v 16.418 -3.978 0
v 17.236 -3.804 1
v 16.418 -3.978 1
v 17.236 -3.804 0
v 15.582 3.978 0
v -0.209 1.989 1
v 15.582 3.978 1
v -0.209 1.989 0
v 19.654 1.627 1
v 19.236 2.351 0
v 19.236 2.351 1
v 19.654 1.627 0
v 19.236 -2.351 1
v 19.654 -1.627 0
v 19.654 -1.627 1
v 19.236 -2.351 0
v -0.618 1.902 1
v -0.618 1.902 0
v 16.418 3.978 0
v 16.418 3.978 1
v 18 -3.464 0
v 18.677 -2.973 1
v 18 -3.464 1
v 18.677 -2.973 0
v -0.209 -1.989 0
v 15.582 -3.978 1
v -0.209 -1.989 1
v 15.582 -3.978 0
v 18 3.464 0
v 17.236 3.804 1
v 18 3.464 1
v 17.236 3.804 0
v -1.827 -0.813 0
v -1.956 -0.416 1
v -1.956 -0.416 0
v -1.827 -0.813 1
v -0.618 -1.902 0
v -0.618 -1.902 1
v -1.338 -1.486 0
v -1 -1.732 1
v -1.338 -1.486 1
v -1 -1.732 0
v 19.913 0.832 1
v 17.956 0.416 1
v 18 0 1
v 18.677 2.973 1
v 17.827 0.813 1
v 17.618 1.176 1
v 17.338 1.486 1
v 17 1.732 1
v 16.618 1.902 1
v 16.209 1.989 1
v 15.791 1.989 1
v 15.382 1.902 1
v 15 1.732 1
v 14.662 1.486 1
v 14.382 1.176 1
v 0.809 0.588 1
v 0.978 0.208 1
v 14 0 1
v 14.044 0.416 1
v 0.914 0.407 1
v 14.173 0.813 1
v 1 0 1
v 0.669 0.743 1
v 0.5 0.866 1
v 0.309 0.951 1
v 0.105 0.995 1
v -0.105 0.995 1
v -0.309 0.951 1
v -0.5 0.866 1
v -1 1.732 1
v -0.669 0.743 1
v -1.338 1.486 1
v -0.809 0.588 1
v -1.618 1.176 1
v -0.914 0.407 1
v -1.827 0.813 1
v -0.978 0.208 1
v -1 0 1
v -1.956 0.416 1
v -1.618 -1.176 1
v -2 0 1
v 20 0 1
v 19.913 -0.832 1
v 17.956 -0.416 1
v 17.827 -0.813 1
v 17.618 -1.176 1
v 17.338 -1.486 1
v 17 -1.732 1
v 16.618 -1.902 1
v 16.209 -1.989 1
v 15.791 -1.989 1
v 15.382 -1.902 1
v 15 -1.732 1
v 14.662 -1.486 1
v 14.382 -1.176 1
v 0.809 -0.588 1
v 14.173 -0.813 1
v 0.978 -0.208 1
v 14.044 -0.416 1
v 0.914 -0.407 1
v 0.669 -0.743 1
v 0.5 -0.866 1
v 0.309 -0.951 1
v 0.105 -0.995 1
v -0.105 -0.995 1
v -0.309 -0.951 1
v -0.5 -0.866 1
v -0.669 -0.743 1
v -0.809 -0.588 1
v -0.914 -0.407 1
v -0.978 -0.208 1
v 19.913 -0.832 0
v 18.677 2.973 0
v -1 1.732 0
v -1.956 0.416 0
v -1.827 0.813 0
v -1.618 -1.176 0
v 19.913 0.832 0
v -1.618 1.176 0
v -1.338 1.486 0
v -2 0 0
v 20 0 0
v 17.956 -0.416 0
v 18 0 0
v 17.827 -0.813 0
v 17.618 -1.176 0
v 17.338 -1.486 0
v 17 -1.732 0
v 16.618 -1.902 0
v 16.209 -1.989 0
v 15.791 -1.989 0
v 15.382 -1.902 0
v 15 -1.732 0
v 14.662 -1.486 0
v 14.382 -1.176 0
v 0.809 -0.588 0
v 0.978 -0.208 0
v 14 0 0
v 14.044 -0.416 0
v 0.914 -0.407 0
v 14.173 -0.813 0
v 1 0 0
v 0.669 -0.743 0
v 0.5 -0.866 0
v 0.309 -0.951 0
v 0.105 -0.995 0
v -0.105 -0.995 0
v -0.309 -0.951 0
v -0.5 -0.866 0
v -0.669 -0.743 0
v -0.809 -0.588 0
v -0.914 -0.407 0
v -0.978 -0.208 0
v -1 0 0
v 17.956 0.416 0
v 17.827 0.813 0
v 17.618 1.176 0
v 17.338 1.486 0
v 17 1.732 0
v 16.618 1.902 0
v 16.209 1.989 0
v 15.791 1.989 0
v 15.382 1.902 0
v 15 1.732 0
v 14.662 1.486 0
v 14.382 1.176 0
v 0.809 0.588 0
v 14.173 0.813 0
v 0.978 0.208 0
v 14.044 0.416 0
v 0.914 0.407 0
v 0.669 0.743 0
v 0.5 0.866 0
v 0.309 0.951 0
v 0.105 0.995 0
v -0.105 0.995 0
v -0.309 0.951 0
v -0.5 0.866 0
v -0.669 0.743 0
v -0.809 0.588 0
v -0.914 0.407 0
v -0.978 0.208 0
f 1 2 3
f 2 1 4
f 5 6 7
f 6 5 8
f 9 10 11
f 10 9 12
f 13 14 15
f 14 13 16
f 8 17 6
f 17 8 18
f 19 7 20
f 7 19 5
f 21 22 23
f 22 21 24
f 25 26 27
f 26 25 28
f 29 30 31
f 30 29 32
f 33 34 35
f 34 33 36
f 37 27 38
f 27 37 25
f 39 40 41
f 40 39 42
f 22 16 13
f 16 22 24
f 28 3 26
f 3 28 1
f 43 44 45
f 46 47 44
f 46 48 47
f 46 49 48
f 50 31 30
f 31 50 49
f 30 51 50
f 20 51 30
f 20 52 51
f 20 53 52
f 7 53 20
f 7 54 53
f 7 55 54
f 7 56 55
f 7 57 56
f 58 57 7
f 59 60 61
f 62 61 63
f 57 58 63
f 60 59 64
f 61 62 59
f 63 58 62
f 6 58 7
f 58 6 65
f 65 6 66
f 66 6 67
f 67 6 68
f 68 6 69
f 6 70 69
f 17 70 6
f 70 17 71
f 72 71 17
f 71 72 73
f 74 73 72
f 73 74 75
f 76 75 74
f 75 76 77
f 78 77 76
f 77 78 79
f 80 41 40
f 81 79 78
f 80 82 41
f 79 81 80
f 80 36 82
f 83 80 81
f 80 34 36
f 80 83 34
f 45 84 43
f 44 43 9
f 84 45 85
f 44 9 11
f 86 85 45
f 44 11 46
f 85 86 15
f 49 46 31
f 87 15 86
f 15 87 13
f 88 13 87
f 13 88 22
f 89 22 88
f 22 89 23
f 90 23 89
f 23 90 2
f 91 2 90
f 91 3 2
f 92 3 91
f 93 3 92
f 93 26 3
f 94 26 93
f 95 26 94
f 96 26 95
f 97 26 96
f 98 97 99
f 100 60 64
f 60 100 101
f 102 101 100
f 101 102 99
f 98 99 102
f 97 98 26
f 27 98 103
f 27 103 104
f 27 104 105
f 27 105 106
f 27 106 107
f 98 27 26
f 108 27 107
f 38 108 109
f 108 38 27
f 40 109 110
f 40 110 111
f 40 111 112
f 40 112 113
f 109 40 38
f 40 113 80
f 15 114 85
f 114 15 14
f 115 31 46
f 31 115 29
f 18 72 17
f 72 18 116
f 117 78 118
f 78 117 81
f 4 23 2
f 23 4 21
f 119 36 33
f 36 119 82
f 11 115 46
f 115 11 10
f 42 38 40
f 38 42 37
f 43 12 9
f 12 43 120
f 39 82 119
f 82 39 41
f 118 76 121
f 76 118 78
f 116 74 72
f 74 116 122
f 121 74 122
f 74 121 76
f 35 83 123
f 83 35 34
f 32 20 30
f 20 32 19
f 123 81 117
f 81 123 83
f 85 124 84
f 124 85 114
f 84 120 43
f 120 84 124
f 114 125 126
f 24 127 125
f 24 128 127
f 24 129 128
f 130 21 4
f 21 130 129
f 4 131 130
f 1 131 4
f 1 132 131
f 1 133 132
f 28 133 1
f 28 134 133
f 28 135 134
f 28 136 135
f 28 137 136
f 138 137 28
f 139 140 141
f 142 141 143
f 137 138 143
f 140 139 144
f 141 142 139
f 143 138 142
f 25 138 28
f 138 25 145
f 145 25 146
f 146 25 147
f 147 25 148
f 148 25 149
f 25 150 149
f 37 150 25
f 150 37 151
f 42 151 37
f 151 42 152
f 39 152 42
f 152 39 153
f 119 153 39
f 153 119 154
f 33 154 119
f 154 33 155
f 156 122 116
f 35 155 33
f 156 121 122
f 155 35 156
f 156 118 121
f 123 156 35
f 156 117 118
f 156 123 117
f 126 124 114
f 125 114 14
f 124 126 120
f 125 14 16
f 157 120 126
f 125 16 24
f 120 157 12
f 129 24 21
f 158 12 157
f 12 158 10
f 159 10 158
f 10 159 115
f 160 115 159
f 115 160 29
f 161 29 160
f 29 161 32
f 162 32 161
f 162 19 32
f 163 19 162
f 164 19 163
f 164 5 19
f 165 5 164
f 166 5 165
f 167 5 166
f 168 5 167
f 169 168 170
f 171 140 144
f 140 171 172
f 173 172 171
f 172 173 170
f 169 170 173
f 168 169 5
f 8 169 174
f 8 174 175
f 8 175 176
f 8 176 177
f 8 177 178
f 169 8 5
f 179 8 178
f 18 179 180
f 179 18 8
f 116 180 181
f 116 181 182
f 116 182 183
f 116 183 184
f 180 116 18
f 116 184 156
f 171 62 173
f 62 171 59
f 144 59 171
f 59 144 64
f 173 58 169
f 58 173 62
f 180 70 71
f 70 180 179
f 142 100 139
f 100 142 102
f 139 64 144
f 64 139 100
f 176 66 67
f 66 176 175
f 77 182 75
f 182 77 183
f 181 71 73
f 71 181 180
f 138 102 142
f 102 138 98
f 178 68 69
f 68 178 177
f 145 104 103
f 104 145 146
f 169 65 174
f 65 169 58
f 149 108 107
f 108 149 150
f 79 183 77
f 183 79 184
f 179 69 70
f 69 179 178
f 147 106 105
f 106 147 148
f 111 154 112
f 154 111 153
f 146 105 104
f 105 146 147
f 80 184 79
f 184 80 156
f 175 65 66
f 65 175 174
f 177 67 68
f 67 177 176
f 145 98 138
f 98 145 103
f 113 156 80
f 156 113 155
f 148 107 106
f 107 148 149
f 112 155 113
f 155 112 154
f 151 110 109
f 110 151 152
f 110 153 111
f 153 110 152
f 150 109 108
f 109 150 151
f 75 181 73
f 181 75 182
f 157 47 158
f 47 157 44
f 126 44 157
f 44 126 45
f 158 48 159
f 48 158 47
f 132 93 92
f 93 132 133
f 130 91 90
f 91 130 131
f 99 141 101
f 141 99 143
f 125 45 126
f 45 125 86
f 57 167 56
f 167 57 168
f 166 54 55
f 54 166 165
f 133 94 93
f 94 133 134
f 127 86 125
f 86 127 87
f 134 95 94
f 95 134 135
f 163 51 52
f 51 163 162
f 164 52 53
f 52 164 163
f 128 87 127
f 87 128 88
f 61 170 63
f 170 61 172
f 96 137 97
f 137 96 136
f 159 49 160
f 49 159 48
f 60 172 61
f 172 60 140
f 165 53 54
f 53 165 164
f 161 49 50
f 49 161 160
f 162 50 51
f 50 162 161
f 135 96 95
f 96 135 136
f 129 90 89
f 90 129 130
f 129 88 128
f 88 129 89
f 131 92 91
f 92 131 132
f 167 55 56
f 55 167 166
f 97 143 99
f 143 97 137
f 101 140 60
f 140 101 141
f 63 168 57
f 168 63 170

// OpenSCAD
difference(){
hull(){

cylinder(1,2,2,$fn=30);


translate([16,0,0])
cylinder(1,4,4, $fn=30);


}


cylinder(3,1,1,$fn=30, center= true);


translate([16,0,0])
cylinder(3,2,2,$fn=30, center= true);
}
